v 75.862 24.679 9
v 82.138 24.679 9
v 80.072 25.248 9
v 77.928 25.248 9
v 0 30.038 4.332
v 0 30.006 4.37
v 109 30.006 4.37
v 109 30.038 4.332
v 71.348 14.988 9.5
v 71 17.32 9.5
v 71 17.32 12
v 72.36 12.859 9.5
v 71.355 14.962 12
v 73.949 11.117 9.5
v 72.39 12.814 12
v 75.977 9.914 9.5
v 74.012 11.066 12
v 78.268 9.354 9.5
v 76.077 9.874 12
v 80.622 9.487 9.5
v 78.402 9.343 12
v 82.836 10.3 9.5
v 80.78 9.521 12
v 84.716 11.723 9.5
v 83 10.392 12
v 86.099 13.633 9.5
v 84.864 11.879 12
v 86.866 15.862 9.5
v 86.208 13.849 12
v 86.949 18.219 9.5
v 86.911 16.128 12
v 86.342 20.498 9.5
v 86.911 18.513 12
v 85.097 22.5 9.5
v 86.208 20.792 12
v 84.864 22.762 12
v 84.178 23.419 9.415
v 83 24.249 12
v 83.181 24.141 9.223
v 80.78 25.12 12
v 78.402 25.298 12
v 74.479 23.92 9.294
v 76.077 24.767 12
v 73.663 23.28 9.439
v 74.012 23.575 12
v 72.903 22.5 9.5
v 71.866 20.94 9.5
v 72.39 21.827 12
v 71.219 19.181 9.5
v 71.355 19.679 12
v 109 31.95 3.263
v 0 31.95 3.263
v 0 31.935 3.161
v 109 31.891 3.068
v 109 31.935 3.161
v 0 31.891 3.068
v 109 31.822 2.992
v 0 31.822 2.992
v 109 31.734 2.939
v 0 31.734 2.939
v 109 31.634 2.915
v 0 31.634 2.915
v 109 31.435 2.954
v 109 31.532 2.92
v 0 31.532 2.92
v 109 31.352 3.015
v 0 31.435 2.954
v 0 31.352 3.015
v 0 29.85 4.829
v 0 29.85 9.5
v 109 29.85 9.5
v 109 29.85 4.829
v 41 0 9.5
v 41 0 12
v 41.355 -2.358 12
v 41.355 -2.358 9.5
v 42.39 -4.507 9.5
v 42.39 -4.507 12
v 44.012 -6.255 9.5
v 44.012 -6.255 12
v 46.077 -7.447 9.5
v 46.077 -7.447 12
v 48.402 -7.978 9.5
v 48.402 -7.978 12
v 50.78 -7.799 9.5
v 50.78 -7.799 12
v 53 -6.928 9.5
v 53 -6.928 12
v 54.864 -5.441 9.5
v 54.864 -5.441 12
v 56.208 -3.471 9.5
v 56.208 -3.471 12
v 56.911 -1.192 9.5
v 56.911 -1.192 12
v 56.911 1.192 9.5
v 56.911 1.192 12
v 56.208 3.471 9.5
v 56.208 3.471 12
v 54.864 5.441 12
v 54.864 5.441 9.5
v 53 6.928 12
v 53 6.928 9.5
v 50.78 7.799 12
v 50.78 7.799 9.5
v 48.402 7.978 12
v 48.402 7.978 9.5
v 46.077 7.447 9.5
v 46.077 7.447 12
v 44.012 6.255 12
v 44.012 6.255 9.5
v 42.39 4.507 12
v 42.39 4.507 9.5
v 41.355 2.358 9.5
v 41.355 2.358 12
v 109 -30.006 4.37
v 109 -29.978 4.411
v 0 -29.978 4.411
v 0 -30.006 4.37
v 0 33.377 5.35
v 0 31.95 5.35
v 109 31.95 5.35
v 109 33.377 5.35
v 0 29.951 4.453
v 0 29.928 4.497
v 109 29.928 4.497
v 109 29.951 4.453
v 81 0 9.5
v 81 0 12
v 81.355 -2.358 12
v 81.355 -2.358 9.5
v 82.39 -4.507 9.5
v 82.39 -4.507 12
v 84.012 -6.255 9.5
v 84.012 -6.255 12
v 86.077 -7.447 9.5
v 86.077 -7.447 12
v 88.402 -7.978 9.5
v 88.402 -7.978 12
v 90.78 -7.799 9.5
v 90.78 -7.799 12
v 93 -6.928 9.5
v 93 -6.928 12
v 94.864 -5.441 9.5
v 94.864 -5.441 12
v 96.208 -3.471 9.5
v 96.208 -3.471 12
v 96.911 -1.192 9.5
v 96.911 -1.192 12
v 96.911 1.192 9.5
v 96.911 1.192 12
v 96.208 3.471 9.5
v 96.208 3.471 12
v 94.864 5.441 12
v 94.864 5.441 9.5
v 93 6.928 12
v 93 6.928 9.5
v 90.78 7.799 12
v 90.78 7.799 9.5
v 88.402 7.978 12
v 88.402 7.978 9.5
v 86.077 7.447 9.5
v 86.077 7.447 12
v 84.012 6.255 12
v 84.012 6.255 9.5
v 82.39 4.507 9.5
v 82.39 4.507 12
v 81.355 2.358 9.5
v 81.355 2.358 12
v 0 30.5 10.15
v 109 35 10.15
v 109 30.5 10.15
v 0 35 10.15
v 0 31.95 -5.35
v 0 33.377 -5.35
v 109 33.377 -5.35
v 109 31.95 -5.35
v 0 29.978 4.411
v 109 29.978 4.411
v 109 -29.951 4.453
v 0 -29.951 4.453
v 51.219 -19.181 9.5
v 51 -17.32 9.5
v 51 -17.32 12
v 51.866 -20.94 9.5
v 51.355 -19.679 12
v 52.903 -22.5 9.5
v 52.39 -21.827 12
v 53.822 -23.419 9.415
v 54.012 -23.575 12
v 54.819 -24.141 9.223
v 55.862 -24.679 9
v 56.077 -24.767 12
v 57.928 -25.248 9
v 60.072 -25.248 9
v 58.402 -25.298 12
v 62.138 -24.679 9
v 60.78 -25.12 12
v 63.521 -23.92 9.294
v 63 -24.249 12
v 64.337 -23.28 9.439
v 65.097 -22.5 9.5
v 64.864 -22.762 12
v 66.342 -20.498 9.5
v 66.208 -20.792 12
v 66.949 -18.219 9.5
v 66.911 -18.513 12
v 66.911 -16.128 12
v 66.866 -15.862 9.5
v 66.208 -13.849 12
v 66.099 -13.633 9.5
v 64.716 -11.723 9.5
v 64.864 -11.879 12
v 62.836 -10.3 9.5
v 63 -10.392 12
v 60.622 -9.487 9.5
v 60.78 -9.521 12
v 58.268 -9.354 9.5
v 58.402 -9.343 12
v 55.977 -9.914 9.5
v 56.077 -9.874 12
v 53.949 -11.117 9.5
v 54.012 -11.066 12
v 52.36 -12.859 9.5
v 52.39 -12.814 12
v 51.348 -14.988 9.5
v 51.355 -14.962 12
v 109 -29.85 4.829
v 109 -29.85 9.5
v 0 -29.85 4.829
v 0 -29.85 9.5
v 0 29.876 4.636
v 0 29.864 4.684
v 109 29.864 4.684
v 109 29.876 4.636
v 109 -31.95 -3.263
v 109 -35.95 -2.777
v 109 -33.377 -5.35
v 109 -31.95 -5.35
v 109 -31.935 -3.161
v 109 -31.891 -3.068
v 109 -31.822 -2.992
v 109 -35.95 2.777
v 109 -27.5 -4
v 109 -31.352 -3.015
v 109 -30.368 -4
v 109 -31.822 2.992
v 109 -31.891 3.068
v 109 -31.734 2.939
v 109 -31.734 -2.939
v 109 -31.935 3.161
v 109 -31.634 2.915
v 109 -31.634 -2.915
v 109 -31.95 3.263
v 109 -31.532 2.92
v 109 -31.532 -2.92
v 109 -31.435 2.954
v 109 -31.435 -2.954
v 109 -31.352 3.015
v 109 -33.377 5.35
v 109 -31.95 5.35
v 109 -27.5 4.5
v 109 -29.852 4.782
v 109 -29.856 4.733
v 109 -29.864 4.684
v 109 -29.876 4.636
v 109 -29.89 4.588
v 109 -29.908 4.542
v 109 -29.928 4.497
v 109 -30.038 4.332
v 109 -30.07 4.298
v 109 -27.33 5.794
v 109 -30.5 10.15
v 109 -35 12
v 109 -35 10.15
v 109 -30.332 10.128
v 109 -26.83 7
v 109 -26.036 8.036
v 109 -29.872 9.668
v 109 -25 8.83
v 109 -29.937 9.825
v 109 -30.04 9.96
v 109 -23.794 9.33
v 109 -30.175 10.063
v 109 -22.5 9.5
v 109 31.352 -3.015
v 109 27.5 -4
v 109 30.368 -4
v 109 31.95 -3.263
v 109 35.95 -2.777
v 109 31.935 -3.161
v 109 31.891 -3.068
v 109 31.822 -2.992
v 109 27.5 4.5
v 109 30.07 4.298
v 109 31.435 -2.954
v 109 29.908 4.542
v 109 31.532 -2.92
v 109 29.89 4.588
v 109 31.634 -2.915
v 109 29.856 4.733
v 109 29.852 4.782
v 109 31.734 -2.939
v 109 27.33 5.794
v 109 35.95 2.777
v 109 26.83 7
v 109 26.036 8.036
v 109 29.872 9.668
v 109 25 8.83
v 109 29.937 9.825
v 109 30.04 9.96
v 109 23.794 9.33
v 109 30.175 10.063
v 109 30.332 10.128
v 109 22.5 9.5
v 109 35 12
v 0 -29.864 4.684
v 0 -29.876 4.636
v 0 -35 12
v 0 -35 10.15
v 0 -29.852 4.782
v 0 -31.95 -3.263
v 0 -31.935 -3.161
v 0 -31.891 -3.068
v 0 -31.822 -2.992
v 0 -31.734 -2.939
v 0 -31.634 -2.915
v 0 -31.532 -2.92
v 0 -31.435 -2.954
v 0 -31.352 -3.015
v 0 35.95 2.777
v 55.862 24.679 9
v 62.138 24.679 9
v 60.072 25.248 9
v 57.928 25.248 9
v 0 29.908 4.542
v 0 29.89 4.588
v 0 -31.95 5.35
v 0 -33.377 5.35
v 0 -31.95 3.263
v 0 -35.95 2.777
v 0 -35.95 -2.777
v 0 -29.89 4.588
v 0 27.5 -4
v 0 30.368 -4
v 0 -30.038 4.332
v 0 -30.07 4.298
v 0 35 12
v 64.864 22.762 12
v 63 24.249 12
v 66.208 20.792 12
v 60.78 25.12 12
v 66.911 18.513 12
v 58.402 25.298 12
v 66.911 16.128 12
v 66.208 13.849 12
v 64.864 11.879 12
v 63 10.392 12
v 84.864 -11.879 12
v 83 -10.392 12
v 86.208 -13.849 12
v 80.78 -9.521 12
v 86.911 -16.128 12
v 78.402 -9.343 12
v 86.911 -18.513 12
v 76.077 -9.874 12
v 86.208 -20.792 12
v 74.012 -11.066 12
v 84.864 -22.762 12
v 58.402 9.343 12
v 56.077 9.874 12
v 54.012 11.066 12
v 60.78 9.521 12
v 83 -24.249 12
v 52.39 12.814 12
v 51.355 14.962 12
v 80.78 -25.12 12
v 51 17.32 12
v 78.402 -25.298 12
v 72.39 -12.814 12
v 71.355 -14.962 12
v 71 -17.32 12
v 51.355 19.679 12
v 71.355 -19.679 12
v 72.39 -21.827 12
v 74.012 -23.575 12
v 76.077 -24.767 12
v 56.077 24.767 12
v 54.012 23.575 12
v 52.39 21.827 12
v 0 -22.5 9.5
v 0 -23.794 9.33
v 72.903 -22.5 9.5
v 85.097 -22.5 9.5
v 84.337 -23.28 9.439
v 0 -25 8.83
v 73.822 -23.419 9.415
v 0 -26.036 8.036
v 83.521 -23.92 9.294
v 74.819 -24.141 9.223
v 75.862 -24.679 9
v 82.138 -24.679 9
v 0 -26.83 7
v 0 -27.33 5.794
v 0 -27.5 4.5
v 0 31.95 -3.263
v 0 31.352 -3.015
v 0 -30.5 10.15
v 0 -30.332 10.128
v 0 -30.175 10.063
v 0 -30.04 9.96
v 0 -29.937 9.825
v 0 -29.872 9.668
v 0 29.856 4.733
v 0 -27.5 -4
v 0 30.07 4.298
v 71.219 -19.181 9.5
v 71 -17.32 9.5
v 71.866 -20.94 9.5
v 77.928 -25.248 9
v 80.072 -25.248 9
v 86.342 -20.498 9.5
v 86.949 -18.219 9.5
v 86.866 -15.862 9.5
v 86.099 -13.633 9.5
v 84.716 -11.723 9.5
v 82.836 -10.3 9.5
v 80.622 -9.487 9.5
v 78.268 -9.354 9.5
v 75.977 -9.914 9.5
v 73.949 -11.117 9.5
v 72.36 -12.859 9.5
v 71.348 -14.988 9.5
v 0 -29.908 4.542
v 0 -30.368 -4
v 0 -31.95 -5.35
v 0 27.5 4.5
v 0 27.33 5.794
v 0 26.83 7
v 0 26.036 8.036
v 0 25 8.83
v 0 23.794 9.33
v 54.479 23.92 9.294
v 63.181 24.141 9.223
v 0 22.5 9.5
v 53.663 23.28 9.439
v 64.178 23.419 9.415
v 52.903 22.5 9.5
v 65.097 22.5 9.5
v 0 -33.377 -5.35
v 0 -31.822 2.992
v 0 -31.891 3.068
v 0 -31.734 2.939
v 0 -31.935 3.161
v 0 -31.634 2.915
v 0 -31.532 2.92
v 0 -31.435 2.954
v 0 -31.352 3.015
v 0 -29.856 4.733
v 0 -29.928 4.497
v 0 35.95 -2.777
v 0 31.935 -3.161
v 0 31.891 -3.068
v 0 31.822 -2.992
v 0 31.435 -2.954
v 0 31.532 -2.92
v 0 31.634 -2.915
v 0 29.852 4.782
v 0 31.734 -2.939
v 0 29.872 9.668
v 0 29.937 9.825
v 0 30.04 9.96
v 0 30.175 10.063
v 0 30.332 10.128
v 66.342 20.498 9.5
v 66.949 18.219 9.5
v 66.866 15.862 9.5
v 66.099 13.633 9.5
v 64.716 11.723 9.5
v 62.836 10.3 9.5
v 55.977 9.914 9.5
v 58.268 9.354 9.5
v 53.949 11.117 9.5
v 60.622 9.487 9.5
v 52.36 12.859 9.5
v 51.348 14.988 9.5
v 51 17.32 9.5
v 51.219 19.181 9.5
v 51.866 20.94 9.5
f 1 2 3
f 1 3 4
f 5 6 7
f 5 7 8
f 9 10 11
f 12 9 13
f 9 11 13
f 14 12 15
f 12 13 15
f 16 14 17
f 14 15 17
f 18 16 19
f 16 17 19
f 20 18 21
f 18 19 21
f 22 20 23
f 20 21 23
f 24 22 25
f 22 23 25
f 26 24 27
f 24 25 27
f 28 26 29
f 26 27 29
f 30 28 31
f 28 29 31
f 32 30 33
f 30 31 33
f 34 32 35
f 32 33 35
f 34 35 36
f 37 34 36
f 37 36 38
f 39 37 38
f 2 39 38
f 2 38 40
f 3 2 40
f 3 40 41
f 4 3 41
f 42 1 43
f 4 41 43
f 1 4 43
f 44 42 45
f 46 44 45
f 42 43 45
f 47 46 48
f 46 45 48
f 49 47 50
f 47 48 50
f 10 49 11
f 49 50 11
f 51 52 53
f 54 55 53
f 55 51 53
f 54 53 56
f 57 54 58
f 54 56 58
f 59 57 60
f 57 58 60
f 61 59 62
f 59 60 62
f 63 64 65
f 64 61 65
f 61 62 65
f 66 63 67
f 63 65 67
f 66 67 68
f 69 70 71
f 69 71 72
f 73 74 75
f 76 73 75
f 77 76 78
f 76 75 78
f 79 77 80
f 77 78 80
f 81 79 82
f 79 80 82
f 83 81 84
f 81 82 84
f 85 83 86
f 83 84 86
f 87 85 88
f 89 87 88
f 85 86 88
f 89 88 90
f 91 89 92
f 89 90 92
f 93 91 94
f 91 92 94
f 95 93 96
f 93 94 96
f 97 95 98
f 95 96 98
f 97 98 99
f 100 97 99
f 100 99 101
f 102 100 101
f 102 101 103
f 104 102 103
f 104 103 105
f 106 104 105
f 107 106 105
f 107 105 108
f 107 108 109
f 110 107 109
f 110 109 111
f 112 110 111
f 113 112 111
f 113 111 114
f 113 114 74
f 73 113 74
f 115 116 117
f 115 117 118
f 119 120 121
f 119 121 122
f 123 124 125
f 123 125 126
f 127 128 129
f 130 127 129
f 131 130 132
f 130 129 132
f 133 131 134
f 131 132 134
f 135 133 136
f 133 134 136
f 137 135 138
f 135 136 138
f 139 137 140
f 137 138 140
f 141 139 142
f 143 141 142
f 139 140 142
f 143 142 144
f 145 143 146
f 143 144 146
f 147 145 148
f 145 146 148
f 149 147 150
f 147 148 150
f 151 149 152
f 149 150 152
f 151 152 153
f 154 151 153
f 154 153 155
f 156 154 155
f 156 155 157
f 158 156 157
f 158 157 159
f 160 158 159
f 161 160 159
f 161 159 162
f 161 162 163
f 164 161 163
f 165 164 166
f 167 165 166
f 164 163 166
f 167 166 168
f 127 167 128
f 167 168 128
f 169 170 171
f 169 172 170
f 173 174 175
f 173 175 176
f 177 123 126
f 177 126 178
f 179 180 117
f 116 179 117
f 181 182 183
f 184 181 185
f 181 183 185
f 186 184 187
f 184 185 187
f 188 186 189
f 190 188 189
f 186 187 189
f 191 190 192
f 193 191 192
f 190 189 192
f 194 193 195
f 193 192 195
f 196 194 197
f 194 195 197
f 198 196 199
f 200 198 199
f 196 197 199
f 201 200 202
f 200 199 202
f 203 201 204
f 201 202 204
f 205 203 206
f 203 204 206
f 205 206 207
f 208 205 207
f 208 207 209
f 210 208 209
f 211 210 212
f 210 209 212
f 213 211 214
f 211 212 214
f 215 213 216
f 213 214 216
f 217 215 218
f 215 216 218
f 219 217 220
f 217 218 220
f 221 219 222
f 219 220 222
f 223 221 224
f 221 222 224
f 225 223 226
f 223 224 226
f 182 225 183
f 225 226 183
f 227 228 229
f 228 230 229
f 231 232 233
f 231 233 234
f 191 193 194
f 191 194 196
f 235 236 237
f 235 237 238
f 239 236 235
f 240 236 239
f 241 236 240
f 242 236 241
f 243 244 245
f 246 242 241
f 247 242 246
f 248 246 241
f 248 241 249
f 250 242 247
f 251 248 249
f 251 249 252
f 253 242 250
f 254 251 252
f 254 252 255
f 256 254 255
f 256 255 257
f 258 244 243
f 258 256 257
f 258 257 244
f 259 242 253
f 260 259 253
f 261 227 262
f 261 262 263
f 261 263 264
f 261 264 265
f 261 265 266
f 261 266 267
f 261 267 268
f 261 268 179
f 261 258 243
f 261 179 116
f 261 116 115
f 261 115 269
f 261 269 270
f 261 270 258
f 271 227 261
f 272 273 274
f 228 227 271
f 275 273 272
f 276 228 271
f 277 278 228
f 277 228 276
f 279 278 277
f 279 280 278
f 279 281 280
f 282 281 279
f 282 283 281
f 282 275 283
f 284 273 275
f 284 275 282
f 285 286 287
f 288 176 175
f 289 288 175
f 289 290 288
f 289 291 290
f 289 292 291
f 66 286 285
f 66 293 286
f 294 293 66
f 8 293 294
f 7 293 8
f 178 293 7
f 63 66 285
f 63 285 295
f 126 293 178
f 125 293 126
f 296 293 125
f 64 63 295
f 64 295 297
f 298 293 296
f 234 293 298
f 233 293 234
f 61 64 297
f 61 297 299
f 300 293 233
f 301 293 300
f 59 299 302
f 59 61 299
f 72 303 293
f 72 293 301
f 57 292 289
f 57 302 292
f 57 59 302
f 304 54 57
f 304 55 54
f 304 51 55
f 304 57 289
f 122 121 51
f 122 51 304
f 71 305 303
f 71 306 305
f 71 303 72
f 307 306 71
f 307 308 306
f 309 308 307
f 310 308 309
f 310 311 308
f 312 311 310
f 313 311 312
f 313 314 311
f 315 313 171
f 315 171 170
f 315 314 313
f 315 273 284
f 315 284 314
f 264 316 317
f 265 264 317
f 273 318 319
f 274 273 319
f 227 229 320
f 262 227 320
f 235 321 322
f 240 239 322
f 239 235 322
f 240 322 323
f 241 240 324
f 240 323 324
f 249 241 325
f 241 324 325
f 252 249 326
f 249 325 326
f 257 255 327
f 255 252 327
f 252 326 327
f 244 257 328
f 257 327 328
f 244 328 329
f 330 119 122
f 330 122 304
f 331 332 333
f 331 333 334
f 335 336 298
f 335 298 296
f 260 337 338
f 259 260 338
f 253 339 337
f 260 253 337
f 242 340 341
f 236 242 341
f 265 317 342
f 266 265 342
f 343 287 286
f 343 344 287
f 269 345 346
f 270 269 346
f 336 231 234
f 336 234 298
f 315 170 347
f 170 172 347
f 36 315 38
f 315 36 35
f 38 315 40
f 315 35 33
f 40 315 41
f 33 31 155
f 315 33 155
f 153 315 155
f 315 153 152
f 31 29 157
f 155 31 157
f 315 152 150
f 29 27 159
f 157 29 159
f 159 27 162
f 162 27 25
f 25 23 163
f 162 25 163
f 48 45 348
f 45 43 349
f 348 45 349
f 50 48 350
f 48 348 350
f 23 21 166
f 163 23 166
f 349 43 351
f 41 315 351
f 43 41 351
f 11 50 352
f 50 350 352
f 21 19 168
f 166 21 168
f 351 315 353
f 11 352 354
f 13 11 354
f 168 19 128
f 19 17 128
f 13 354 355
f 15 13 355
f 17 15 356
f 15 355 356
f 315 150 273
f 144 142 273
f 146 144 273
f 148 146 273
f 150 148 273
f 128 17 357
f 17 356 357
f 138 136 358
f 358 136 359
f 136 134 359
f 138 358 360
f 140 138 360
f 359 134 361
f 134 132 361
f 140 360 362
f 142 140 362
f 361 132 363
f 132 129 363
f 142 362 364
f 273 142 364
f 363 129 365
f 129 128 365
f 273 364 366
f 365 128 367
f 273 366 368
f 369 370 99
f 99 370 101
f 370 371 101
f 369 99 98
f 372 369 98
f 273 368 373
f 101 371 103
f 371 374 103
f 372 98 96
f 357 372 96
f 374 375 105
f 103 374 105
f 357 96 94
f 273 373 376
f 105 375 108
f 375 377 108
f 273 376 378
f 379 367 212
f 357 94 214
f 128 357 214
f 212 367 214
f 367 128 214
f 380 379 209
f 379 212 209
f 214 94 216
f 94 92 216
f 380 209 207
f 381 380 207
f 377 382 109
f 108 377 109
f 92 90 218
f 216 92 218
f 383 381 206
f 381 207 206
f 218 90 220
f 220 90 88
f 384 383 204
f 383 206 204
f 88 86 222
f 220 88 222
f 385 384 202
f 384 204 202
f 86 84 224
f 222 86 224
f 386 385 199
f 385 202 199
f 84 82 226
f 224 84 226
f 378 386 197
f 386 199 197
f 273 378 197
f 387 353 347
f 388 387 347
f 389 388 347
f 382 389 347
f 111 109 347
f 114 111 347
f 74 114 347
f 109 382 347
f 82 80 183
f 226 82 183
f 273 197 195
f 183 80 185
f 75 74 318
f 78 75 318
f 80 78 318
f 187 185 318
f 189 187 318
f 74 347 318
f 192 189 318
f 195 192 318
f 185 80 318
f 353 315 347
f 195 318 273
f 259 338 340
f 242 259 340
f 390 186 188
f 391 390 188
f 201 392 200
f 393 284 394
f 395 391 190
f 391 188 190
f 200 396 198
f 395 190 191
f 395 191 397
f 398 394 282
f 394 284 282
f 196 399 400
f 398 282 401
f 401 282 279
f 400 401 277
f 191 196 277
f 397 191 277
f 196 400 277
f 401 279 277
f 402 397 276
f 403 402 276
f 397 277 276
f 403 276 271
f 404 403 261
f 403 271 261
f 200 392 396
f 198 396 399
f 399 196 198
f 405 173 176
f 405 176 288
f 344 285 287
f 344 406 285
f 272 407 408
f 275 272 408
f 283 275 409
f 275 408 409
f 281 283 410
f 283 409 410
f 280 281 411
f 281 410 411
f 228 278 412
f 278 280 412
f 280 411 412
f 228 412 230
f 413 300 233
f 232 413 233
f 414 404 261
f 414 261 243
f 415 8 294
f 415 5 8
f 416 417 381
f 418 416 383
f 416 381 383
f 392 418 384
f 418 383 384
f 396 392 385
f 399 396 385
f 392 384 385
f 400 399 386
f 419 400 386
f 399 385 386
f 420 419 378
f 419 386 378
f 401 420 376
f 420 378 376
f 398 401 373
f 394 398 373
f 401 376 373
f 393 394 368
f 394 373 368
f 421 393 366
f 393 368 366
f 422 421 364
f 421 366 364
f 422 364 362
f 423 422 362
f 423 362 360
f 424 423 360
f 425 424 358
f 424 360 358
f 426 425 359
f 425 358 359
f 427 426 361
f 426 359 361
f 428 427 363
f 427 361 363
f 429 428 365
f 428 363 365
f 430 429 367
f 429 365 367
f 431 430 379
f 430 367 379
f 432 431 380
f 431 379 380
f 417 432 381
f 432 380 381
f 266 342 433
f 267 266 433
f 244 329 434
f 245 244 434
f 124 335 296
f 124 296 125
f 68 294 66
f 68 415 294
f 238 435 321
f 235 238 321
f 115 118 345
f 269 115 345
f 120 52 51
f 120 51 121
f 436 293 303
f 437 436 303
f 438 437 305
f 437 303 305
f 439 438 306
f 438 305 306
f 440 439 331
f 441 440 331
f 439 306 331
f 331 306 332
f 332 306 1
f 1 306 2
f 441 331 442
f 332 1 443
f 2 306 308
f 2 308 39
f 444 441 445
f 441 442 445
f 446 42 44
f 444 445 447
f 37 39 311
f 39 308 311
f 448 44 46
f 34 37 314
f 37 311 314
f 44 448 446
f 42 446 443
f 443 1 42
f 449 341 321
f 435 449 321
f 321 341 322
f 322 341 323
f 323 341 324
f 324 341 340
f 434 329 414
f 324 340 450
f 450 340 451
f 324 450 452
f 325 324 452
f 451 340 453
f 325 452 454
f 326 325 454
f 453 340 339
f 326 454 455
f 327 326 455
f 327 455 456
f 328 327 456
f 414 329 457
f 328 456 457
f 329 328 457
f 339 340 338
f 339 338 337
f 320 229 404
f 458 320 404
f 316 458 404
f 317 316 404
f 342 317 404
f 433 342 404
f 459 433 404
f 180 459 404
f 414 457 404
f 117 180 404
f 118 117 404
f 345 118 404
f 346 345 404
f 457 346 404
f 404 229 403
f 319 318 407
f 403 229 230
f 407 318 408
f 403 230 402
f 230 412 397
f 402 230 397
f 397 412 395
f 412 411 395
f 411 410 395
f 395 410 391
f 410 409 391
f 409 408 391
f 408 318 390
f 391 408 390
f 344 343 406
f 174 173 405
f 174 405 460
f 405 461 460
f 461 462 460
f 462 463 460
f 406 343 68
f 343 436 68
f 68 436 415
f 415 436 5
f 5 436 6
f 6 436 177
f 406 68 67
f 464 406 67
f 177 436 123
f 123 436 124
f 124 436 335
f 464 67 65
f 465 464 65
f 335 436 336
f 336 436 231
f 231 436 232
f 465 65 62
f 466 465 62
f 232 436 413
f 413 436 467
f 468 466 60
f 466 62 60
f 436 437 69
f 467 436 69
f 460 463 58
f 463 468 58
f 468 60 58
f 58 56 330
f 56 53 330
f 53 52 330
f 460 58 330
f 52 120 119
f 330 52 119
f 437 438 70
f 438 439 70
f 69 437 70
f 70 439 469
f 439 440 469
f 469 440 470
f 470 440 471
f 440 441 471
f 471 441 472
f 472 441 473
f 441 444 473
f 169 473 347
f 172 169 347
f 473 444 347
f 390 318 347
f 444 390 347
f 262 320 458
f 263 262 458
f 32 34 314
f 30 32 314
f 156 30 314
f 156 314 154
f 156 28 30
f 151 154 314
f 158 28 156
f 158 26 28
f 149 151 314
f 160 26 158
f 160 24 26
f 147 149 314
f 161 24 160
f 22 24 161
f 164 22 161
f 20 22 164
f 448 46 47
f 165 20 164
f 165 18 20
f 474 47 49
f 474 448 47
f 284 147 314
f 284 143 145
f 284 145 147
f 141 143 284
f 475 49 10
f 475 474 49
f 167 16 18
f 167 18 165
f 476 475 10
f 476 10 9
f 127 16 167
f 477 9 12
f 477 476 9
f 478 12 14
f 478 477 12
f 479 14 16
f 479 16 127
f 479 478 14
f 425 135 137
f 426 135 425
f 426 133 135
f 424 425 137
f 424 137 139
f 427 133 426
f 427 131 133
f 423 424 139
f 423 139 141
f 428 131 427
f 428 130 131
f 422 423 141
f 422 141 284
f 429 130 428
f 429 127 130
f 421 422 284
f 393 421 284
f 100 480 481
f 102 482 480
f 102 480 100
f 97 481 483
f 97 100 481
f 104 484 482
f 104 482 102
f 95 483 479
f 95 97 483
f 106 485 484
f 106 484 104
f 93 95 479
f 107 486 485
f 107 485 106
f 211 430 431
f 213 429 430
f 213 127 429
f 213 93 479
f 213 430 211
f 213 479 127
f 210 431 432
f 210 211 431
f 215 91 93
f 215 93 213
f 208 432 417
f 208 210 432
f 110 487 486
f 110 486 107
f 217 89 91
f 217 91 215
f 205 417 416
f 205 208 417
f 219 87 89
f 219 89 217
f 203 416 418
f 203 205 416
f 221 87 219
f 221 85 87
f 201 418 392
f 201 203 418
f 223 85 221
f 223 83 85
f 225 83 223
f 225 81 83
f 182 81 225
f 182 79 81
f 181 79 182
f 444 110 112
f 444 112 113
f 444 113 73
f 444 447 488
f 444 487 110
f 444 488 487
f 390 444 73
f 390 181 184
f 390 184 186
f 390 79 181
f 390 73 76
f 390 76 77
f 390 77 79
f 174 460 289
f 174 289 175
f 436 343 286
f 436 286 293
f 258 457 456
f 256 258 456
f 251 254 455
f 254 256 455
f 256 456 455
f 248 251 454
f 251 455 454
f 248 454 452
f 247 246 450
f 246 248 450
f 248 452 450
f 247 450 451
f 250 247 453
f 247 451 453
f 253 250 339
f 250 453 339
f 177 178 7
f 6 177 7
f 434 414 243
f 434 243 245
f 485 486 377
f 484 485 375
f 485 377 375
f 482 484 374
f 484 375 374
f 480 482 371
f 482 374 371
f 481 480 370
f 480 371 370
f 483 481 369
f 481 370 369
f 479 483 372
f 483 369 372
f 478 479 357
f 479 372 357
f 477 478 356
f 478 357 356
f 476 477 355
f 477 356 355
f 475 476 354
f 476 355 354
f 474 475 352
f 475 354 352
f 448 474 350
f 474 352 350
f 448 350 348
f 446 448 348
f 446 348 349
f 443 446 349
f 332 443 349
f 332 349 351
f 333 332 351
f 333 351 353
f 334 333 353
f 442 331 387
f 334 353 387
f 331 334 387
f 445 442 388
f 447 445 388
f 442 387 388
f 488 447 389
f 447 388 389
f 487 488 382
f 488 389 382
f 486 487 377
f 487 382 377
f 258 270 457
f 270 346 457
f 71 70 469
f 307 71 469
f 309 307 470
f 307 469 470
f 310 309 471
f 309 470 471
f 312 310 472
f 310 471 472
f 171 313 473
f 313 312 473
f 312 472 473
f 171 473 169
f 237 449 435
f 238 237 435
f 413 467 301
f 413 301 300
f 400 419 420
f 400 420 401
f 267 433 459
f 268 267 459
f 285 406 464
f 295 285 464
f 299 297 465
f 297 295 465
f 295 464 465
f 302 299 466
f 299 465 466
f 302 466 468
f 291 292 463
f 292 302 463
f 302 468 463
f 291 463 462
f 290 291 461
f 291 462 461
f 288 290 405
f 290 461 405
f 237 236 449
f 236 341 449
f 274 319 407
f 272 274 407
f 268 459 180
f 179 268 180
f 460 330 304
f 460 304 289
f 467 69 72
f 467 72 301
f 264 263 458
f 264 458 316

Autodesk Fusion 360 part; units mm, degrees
sketch "Sketch1" plane through (0, 0, 0) normal (1, 0, 0) x (0, 1, 0)
  line L0 (36.1, 2.8393) -> (36.1, 0.1999) construction
  line L1 (29.9076, 4.5417) -> (29.928, 4.4966)
  line L2 (-31.8, -5.5) -> (-31.8, -3.2628) construction
  line L3 (-36.1, 2.8393) -> (-36.1, 0.1999) construction
  line L4 (30.0626, 4.563) -> (30.0813, 4.5279) construction
  line L5 (31.4586, -3.1214) -> (30.1778, -4.4022) construction
  arc A0 (-31.3525, -3.0154) -> (-31.95, -3.2628) centre (-31.6, -3.2628) ccw
  line L6 (30.0462, 4.5991) -> (30.0626, 4.563) construction
  line L7 (30.1023, 4.4942) -> (30.1254, 4.4619) construction
  arc A1 (31.8, -3.2628) -> (31.4586, -3.1214) centre (31.6, -3.2628) ccw construction
  line L8 (30.0322, 4.6363) -> (30.0462, 4.5991) construction
  line L9 (31.8, -5.5) -> (31.8, -3.2628) construction
  line L10 (-31.95, -5.35) -> (-31.95, -3.2628)
  line L11 (-31.8, -5.5) -> (-31.8, -3.2628) construction
  line L12 (35.15, 10) -> (31.5, 10) construction
  line L13 (29.9514, 4.4529) -> (29.9775, 4.4108)
  arc A2 (-31.4586, -3.1214) -> (-31.8, -3.2628) centre (-31.6, -3.2628) ccw construction
  line L14 (31.95, -5.35) -> (31.95, -3.2628)
  line L15 (-33.4393, -5.5) -> (-31.8, -5.5) construction
  line L16 (33.4393, -5.5) -> (31.8, -5.5) construction
  line L17 (31.3525, -3.0154) -> (30.3679, -4)
  line L18 (29.8757, 4.6355) -> (29.8901, 4.5881)
  line L19 (29.8901, 4.5881) -> (29.9076, 4.5417)
  line L20 (-33.4393, -5.5) -> (-31.8, -5.5) construction
  arc A3 (-31.4586, -3.1214) -> (-31.8, -3.2628) centre (-31.6, -3.2628) ccw construction
  line L21 (35.15, 10) -> (31.5, 10) construction
  line L22 (-33.3772, -5.35) -> (-31.95, -5.35)
  line L23 (33.3772, 5.35) -> (35.95, 2.7772)
  line L24 (36.1, 2.8393) -> (36.1, 0.1999) construction
  line L25 (-31.3525, -3.0154) -> (-30.3679, -4)
  arc A4 (31.95, -3.2628) -> (31.3525, -3.0154) centre (31.6, -3.2628) ccw
  line L26 (33.4393, -5.5) -> (31.8, -5.5) construction
  line L27 (35.95, 2.7772) -> (35.95, 0.1377)
  arc A5 (31.8, -3.2628) -> (31.4586, -3.1214) centre (31.6, -3.2628) ccw construction
  line L28 (31.4586, -3.1214) -> (30.1778, -4.4022) construction
  line L29 (33.3772, -5.35) -> (31.95, -5.35)
  line L30 (31.8, -5.5) -> (31.8, -3.2628) construction
  line L31 (-29.9076, 4.5417) -> (-29.928, 4.4966)
  line L32 (-30.0626, 4.563) -> (-30.0813, 4.5279) construction
  line L33 (-36.1, 0.1999) -> (-36.2999, 0) construction
  line L34 (-30.0064, 4.3705) -> (-30.0378, 4.3322)
  line L35 (36.1, -0.1999) -> (36.1, -2.8393) construction
  line L36 (-30.1023, 4.4942) -> (-30.1254, 4.4619) construction
  line L37 (-30.0813, 4.5279) -> (-30.1023, 4.4942) construction
  line L38 (35.95, -0.1377) -> (35.95, -2.7772)
  line L39 (-29.8901, 4.5881) -> (-29.9076, 4.5417)
  line L40 (30.0117, 4.713) -> (30.0207, 4.6743) construction
  line L41 (-36.1, -0.1999) -> (-36.1, -2.8393) construction
  circle A6 centre (-40, 0) radius 2.1 construction
  line L42 (-30.0462, 4.5991) -> (-30.0626, 4.563) construction
  line L43 (30.0052, 4.7522) -> (30.0117, 4.713) construction
  line L44 (30.1023, 4.4942) -> (30.1254, 4.4619) construction
  line L45 (-30.0462, 4.5991) -> (-30.0626, 4.563) construction
  line L46 (30.0462, 4.5991) -> (30.0626, 4.563) construction
  line L47 (30.1254, 4.4619) -> (30.1506, 4.4312) construction
  line L48 (-36.1, 0.1999) -> (-36.2999, 0) construction
  line L49 (30.0813, 4.5279) -> (30.1023, 4.4942) construction
  line L50 (30.0626, 4.563) -> (30.0813, 4.5279) construction
  line L51 (-30.0813, 4.5279) -> (-30.1023, 4.4942) construction
  line L52 (29.9775, 4.4108) -> (30.0064, 4.3705)
  line L53 (-30.0626, 4.563) -> (-30.0813, 4.5279) construction
  line L54 (-36.2999, 0) -> (-36.1, -0.1999) construction
  line L55 (30.0378, 4.3322) -> (30.07, 4.2979)
  line L56 (30.0322, 4.6363) -> (30.0462, 4.5991) construction
  line L57 (30.0064, 4.3705) -> (30.0378, 4.3322)
  line L58 (-29.9775, 4.4108) -> (-30.0064, 4.3705)
  line L59 (-36.1, -0.1999) -> (-36.1, -2.8393) construction
  line L60 (-35.95, -0.1377) -> (-35.95, -2.7772)
  line L61 (-30.0378, 4.3322) -> (-30.07, 4.2979)
  line L62 (-36.2999, 0) -> (-36.1, -0.1999) construction
  line L63 (30.0813, 4.5279) -> (30.1023, 4.4942) construction
  line L64 (29.928, 4.4966) -> (29.9514, 4.4529)
  line L65 (-30.1254, 4.4619) -> (-30.1506, 4.4312) construction
  line L66 (-30.1254, 4.4619) -> (-30.1506, 4.4312) construction
  line L67 (30.1254, 4.4619) -> (30.1506, 4.4312) construction
  line L68 (-30.1023, 4.4942) -> (-30.1254, 4.4619) construction
  line L69 (36.1, 0.1999) -> (36.2999, 0) construction
  line L70 (-29.9514, 4.4529) -> (-29.9775, 4.4108)
  line L71 (30.0117, 4.713) -> (30.0207, 4.6743) construction
  line L72 (-29.928, 4.4966) -> (-29.9514, 4.4529)
  line L73 (29.8564, 4.7326) -> (29.8645, 4.6837)
  line L74 (30.0013, 4.7917) -> (30.0052, 4.7522) construction
  line L75 (-30.0322, 4.6363) -> (-30.0462, 4.5991) construction
  line L76 (-29.8757, 4.6355) -> (-29.8901, 4.5881)
  line L77 (30.07, 4.2979) -> (31.3525, 3.0154)
  line L78 (36.1, -0.1999) -> (36.1, -2.8393) construction
  circle A7 centre (40, 0) radius 2.1 construction
  line L79 (30.1506, 4.4312) -> (30.1778, 4.4022) construction
  circle A8 centre (40, 0) radius 2.1 construction
  line L80 (-35.15, 10) -> (-31.5, 10) construction
  line L81 (-30.0207, 4.6743) -> (-30.0322, 4.6363) construction
  line L82 (30.1506, 4.4312) -> (30.1778, 4.4022) construction
  line L83 (-29.8515, 4.7819) -> (-29.8564, 4.7326)
  line L84 (-30.0052, 4.7522) -> (-30.0117, 4.713) construction
  line L85 (-29.8645, 4.6837) -> (-29.8757, 4.6355)
  line L86 (36.1, 0.1999) -> (36.2999, 0) construction
  line L87 (-35, 10.15) -> (-31.5, 10.15)
  line L88 (36.2999, 0) -> (36.1, -0.1999) construction
  line L89 (30.0207, 4.6743) -> (30.0322, 4.6363) construction
  line L90 (-30.0052, 4.7522) -> (-30.0117, 4.713) construction
  line L91 (30.0207, 4.6743) -> (30.0322, 4.6363) construction
  line L92 (29.8645, 4.6837) -> (29.8757, 4.6355)
  line L93 (-35.95, -2.7772) -> (-33.3772, -5.35)
  line L94 (-36.1, -2.8393) -> (-33.4393, -5.5) construction
  line L95 (30.0013, 4.7917) -> (30.0052, 4.7522) construction
  line L96 (33.4393, 5.5) -> (36.1, 2.8393) construction
  line L97 (-30.0013, 4.7917) -> (-30.0052, 4.7522) construction
  line L98 (-30.0013, 4.7917) -> (-30.0052, 4.7522) construction
  line L99 (-30.0117, 4.713) -> (-30.0207, 4.6743) construction
  line L100 (30.1778, 4.4022) -> (31.4586, 3.1214) construction
  line L101 (30.0052, 4.7522) -> (30.0117, 4.713) construction
  line L102 (36.1, -2.8393) -> (33.4393, -5.5) construction
  line L103 (30.1778, 4.4022) -> (31.4586, 3.1214) construction
  line L104 (-30.0117, 4.713) -> (-30.0207, 4.6743) construction
  line L105 (-33.4393, 5.5) -> (-36.1, 2.8393) construction
  line L106 (-29.8564, 4.7326) -> (-29.8645, 4.6837)
  line L107 (36.1, -2.8393) -> (33.4393, -5.5) construction
  line L108 (-33.3772, 5.35) -> (-35.95, 2.7772)
  arc A9 (31.4586, 3.1214) -> (31.8, 3.2628) centre (31.6, 3.2628) ccw construction
  line L109 (29.8515, 4.7819) -> (29.8564, 4.7326)
  line L110 (36.2999, 0) -> (36.1, -0.1999) construction
  line L111 (-36.1, -2.8393) -> (-33.4393, -5.5) construction
  line L112 (-30.0207, 4.6743) -> (-30.0322, 4.6363) construction
  arc A10 (31.4586, 3.1214) -> (31.8, 3.2628) centre (31.6, 3.2628) ccw construction
  arc A11 (31.3525, 3.0154) -> (31.95, 3.2628) centre (31.6, 3.2628) ccw
  line L113 (35.95, -2.7772) -> (33.3772, -5.35)
  line L114 (33.4393, 5.5) -> (36.1, 2.8393) construction
  line L115 (35, 10.15) -> (31.5, 10.15)
  circle A12 centre (-40, 0) radius 2.1 construction
  line L116 (-30.0322, 4.6363) -> (-30.0462, 4.5991) construction
  line L117 (-31.95, 5.35) -> (-33.3772, 5.35)
  line L118 (30, 4.8314) -> (30.0013, 4.7917) construction
  line L119 (29.85, 4.829) -> (29.8515, 4.7819)
  line L120 (-30.1778, 4.4022) -> (-31.4586, 3.1214) construction
  line L121 (31.8, 5.5) -> (33.4393, 5.5) construction
  line L122 (-35.2083, 9.9987) -> (-35.15, 10) construction
  line L123 (-30, 4.8314) -> (-30.0013, 4.7917) construction
  line L124 (-35.2083, 9.9987) -> (-35.15, 10) construction
  arc A13 (30.5, 10) -> (30, 9.5) centre (30.5, 9.5) ccw construction
  line L125 (-31.95, 3.2628) -> (-31.95, 5.35)
  line L126 (-29.85, 4.829) -> (-29.8515, 4.7819)
  line L127 (30, 9.5) -> (30, 8.5) construction
  arc A14 (30.5, 10.15) -> (29.85, 9.5) centre (30.5, 9.5) ccw
  line L128 (30, 9.5) -> (30, 8.5) construction
  line L129 (31.95, 3.2628) -> (31.95, 5.35)
  arc A15 (-31.8, 3.2628) -> (-31.4586, 3.1214) centre (-31.6, 3.2628) ccw construction
  arc A16 (-31.8, 3.2628) -> (-31.4586, 3.1214) centre (-31.6, 3.2628) ccw construction
  line L130 (31.95, 5.35) -> (33.3772, 5.35)
  line L131 (-30.07, 4.2979) -> (-31.3525, 3.0154)
  arc A17 (-31.95, 3.2628) -> (-31.3525, 3.0154) centre (-31.6, 3.2628) ccw
  line L132 (-33.4393, 5.5) -> (-36.1, 2.8393) construction
  line L133 (-30.1506, 4.4312) -> (-30.1778, 4.4022) construction
  line L134 (29.85, 9.5) -> (29.85, 8.5)
  line L135 (-30.1778, 4.4022) -> (-31.4586, 3.1214) construction
  line L136 (31.5, 10) -> (30.5, 10) construction
  line L137 (30, 8.5) -> (30, 4.8314) construction
  line L138 (-31.5, 10) -> (-30.5, 10) construction
  line L139 (31.8, 3.2628) -> (31.8, 5.5) construction
  line L140 (30, 4.8314) -> (30.0013, 4.7917) construction
  line L141 (-31.5, 10.15) -> (-30.5, 10.15)
  arc A18 (30.5, 10) -> (30, 9.5) centre (30.5, 9.5) ccw construction
  arc A19 (-30, 9.5) -> (-30.5, 10) centre (-30.5, 9.5) ccw construction
  line L142 (-30.1506, 4.4312) -> (-30.1778, 4.4022) construction
  line L143 (31.8, 5.5) -> (33.4393, 5.5) construction
  line L144 (-35.15, 10) -> (-31.5, 10) construction
  line L145 (31.8, 3.2628) -> (31.8, 5.5) construction
  line L146 (30, 8.5) -> (30, 4.8314) construction
  line L147 (-30, 4.8314) -> (-30.0013, 4.7917) construction
  line L148 (29.85, 8.5) -> (29.85, 4.829)
  line L149 (-30, 9.5) -> (-30, 8.5) construction
  line L150 (-29.85, 9.5) -> (-29.85, 8.5)
  arc A20 (-29.85, 9.5) -> (-30.5, 10.15) centre (-30.5, 9.5) ccw
  line L151 (31.5, 10) -> (30.5, 10) construction
  line L152 (-29.85, 8.5) -> (-29.85, 4.829)
  line L153 (-31.8, 5.5) -> (-33.4393, 5.5) construction
  line L154 (-31.8, 3.2628) -> (-31.8, 5.5) construction
  arc A21 (-30, 9.5) -> (-30.5, 10) centre (-30.5, 9.5) ccw construction
  line L155 (-31.8, 5.5) -> (-33.4393, 5.5) construction
  line L156 (-31.5, 10) -> (-30.5, 10) construction
  line L157 (-31.8, 3.2628) -> (-31.8, 5.5) construction
  line L158 (-30, 9.5) -> (-30, 8.5) construction
  line L159 (-30, 8.5) -> (-30, 4.8314) construction
  line L160 (31.5, 10.15) -> (30.5, 10.15)
  line L161 (-30, 8.5) -> (-30, 4.8314) construction
  line L162 (0, 15) -> (0, -15) construction
  line L163 (-35.95, 2.7772) -> (-35.95, 0.1377)
  line L164 (-36.1, 2.8393) -> (-36.1, 0.1999) construction
  line L165 (35, 10.15) -> (35, 12)
  line L166 (35, 12) -> (-35, 12)
  line L167 (-35, 12) -> (-35, 10.15)
  line L168 (30.3679, -4) -> (27.5, -4)
  line L169 (27.5, -4) -> (27.5, 9.5)
  line L170 (27.5, 9.5) -> (-27.5, 9.5)
  line L171 (-27.5, 9.5) -> (-27.5, -4)
  line L172 (-27.5, -4) -> (-30.3679, -4)
  line L173 (35.95, 0.1377) -> (35.95, -0.1377)
  line L174 (-35.95, 0.1377) -> (-35.95, -0.1377)
  dimension "d1" = 16
extrude "Extrude1" add sketch "Sketch1" along normal blind 109
fillet "Fillet1" radius 5 2 edges at (54.5, -27.5, 9.5) (54.5, 27.5, 9.5)
sketch "Sketch2" plane through (0, 0, 12) normal (0, 0, 1) x (-1, 0, 0)
  line L0 (0, -35) -> (0, 35)
  line L1 (0, 35) -> (-109, 35)
  line L2 (-109, 35) -> (-109, -35)
  line L3 (-109, -35) -> (0, -35)
  line L4 (-109, 0) -> (0, 0) construction
  line L5 (-69, 0) -> (-89, 0) construction
  circle A0 centre (-89, 0) radius 8
  circle A1 centre (-79, -17.3205) radius 8
  circle A2 centre (-59, -17.3205) radius 8
  circle A3 centre (-49, 0) radius 8
  circle A4 centre (-59, 17.3205) radius 8
  circle A5 centre (-79, 17.3205) radius 8
  dimension "d11" = 20
  dimension "d12" = 16
  dimension "d14" = 360
extrude "Extrude2" cut sketch "Sketch2" against normal blind 3 contours A0 | A1 | A2 | A3 | A4 | A5
